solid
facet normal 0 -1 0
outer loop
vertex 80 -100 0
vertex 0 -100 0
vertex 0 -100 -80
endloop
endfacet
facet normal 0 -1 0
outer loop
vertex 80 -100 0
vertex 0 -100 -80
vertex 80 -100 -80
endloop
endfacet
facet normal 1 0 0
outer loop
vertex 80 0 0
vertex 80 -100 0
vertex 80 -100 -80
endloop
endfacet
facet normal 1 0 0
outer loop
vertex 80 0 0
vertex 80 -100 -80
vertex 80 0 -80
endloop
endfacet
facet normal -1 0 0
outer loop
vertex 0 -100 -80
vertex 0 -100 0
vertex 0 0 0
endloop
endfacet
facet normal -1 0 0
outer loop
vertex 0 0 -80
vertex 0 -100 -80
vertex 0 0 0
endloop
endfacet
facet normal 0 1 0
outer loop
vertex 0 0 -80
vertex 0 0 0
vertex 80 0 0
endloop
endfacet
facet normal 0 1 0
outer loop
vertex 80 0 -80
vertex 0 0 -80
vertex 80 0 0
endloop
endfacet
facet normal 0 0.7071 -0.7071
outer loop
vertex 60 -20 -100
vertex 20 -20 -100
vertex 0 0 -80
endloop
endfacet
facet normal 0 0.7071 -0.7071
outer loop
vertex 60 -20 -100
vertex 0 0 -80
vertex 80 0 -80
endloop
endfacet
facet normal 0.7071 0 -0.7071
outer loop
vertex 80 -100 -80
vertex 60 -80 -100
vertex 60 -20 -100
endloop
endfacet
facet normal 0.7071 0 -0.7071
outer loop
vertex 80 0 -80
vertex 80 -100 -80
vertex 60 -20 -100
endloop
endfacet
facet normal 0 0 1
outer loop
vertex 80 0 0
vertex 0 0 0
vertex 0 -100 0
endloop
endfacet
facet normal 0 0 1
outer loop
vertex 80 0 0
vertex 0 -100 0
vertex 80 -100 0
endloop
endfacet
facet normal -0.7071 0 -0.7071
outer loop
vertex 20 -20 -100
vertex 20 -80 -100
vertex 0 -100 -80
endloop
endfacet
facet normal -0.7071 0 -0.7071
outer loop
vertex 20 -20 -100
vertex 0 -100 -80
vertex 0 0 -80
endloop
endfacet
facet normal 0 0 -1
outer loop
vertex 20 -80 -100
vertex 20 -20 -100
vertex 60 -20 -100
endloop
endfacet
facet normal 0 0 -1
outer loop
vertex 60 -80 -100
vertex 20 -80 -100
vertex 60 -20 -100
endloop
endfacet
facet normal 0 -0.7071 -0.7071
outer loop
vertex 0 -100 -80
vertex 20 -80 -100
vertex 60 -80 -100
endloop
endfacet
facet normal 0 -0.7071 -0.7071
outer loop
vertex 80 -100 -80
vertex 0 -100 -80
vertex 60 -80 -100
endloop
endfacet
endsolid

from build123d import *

# Parameters (mm, degrees)
F0_W     = 80
F0_H     = 100
F1_DEPTH = 100
F2_SIZE  = 20


with BuildPart() as f1:
    # F0 (on Top) → F1 (new body)
    with BuildSketch(Plane.XY):
        with Locations((40, -50)):
            Rectangle(F0_W, F0_H)
    extrude(amount=-F1_DEPTH)

    # F2
    f2_edges = [f1.edges().sort_by_distance(p)[0] for p in [
        (80, -50, -100),
        (40, -100, -100),
        (40, 0, -100),
        (0, -50, -100),
    ]]
    chamfer(f2_edges, length=F2_SIZE)


solid = f1.part
